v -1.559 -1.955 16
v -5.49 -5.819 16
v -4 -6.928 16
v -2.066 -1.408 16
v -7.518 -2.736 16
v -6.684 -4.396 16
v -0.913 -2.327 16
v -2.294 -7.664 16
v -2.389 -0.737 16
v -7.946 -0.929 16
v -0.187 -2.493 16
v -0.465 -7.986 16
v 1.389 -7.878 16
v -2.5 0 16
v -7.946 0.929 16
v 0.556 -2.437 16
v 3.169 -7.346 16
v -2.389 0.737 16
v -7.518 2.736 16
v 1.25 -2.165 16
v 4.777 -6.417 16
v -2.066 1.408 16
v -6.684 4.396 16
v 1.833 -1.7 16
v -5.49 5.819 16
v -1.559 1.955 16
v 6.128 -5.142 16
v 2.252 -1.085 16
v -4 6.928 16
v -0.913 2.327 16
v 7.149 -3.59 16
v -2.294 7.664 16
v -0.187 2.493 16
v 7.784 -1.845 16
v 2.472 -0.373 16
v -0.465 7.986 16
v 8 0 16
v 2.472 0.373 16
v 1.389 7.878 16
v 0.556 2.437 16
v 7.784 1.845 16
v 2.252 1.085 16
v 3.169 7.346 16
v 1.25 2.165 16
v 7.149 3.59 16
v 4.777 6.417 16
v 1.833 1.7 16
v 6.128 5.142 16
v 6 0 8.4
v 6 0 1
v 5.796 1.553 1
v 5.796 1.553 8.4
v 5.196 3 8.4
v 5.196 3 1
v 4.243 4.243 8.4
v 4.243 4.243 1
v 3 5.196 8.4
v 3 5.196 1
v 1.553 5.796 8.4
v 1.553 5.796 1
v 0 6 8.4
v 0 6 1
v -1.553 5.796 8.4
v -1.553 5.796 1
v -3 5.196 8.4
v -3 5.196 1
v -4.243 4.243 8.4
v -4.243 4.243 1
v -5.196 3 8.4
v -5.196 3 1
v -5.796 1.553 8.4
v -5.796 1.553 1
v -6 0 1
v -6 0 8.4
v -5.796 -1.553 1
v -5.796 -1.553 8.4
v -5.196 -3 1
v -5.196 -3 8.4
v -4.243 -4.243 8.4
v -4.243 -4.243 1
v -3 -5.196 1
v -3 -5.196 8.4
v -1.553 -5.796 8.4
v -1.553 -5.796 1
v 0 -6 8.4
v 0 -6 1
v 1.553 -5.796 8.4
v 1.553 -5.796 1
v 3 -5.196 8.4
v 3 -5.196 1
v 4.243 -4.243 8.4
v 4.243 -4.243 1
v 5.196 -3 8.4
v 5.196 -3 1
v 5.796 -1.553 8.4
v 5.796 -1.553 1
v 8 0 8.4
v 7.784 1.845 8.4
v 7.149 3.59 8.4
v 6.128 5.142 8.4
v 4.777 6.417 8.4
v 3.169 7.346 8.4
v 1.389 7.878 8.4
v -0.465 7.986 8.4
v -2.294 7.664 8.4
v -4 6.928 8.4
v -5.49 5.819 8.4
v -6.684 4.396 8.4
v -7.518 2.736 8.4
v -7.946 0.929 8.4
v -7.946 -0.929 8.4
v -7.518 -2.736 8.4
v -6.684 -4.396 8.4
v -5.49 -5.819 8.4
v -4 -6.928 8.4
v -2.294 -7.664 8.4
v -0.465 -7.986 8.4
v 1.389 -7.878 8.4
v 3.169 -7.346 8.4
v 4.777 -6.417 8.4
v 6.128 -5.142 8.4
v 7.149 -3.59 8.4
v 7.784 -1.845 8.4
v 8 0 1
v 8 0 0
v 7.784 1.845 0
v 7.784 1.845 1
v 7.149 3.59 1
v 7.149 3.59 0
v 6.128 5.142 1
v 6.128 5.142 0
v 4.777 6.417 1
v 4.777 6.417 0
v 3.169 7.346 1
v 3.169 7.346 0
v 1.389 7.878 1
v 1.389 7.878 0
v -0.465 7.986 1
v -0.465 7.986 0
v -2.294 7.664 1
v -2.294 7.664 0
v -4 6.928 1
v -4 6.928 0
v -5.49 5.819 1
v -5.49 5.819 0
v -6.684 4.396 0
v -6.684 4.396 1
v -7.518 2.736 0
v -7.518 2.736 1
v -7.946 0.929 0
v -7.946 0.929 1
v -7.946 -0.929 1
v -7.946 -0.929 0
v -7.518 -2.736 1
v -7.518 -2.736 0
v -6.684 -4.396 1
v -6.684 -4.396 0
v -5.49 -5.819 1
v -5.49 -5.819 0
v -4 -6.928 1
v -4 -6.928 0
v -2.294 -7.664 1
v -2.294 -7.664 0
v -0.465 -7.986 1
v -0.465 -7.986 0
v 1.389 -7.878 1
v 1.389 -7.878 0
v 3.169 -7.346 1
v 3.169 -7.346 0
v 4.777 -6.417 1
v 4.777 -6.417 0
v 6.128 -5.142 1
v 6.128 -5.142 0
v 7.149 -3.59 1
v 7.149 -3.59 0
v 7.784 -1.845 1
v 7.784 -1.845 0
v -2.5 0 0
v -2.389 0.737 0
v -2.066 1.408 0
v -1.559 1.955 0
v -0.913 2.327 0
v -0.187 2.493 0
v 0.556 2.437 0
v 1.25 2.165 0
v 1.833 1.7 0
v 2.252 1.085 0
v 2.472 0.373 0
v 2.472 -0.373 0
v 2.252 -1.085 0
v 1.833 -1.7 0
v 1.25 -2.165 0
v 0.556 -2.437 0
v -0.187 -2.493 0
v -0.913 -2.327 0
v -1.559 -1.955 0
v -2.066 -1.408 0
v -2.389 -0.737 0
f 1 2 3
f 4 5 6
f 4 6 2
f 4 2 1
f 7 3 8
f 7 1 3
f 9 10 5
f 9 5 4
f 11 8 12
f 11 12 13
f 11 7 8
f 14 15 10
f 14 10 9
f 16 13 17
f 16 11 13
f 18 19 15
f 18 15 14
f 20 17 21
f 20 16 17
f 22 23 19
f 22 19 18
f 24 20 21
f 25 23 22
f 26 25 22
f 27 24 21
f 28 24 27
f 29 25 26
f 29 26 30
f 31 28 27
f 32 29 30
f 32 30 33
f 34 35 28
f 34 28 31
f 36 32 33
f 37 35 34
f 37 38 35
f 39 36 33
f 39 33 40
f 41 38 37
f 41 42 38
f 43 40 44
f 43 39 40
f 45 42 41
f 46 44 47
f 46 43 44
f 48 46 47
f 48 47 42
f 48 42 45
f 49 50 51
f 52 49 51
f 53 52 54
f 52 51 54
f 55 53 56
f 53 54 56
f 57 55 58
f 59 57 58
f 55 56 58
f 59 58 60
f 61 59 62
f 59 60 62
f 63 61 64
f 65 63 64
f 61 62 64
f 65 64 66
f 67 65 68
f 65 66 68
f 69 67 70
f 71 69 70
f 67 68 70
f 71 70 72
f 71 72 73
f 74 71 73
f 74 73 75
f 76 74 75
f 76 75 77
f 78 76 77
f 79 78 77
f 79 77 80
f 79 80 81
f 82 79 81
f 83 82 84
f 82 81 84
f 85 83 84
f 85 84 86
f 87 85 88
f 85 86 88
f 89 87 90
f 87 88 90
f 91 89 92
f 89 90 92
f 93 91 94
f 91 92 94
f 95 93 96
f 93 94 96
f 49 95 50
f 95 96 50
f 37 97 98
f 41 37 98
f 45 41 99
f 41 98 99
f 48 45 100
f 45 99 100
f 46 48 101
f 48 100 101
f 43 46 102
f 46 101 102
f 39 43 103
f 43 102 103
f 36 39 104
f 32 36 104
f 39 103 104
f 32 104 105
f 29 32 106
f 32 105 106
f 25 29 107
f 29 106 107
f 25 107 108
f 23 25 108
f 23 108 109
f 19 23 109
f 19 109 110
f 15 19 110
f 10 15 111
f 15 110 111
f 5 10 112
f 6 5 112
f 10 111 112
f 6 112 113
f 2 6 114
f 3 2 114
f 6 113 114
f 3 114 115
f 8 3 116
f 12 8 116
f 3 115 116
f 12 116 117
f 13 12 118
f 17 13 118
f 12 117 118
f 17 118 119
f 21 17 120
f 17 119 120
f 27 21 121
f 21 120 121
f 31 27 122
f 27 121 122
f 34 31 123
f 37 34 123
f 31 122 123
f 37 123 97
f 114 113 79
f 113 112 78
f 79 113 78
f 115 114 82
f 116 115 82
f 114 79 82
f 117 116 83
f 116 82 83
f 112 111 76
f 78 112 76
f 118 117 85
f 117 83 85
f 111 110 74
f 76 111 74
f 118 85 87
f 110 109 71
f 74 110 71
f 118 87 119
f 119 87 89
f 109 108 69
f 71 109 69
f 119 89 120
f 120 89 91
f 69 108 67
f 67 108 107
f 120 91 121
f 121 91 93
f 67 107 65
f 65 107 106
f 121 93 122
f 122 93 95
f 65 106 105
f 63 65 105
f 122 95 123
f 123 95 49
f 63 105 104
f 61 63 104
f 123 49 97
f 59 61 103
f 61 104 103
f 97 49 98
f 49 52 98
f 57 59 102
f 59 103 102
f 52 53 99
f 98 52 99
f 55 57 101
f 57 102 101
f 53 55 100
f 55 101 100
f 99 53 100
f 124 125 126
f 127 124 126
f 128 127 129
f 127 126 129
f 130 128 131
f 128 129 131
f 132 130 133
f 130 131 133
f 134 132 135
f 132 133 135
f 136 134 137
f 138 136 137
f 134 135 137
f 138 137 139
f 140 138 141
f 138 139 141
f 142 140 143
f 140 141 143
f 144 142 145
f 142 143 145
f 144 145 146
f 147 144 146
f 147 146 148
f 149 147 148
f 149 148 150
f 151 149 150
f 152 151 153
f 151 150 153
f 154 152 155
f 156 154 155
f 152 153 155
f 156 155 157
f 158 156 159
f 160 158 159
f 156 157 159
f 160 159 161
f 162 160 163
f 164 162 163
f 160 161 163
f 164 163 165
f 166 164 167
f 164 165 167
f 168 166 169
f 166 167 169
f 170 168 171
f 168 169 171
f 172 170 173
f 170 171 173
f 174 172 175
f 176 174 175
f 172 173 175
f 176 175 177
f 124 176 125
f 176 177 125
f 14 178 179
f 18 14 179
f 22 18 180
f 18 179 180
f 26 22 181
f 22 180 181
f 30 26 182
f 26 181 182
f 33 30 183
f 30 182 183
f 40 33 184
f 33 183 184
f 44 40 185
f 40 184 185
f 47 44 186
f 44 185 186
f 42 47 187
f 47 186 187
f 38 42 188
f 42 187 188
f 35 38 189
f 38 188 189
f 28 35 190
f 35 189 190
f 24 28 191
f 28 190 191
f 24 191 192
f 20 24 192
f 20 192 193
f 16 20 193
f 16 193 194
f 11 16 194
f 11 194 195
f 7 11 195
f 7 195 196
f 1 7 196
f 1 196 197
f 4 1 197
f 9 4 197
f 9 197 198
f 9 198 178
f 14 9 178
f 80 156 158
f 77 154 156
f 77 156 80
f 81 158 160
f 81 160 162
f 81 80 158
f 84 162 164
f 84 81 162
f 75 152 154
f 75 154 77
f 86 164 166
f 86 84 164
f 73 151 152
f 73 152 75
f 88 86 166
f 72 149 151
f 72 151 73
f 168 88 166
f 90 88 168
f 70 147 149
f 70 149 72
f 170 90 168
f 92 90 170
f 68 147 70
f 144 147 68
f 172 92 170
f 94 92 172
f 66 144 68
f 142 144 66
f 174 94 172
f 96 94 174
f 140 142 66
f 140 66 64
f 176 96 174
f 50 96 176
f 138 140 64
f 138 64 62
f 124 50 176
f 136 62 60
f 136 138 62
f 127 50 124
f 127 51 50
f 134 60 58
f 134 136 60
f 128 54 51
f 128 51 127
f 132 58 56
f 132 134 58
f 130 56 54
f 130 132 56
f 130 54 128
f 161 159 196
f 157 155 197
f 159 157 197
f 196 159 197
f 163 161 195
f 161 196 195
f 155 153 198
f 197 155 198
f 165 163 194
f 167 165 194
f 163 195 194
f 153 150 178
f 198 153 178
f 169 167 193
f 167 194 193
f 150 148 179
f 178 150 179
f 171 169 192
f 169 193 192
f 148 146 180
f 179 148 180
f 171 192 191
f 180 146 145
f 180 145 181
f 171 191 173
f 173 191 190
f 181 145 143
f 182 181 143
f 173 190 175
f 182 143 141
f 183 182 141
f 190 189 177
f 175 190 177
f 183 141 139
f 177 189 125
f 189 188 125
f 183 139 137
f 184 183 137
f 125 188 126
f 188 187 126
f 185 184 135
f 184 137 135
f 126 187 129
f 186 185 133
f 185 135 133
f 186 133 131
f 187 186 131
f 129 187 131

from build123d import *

# Parameters (mm, degrees)
SKETCH_1_R          = 8
EXTRUDE_1_DEPTH     = 1
SKETCH_2_R          = 6
EXTRUDE_2_DEPTH     = 7.4
SKETCH_3_R          = 8
EXTRUDE_3_DEPTH     = 7.6
SKETCH_4_R          = 2.5
CUT_EXTRUDE_1_DEPTH = 17


with BuildPart() as part:
    # 草图1 → 凸台-拉伸1 (new body)
    with BuildSketch(Plane.XY):
        Circle(SKETCH_1_R)
    extrude(amount=EXTRUDE_1_DEPTH)

    # 草图2 → 凸台-拉伸2 (add)
    with BuildSketch(Plane.XY.offset(1)):
        Circle(SKETCH_2_R)
    extrude(amount=EXTRUDE_2_DEPTH)

    # 草图3 → 凸台-拉伸3 (add)
    with BuildSketch(Plane.XY.offset(8.4)):
        Circle(SKETCH_3_R)
    extrude(amount=EXTRUDE_3_DEPTH)

    # 草图4 → 切除-拉伸1 (cut, through all)
    with BuildSketch(Plane(origin=(0, 0, 0), x_dir=(-1, 0, 0), z_dir=(0, 0, -1))):
        Circle(SKETCH_4_R)
    extrude(amount=-CUT_EXTRUDE_1_DEPTH, mode=Mode.SUBTRACT)


solid = part.part
